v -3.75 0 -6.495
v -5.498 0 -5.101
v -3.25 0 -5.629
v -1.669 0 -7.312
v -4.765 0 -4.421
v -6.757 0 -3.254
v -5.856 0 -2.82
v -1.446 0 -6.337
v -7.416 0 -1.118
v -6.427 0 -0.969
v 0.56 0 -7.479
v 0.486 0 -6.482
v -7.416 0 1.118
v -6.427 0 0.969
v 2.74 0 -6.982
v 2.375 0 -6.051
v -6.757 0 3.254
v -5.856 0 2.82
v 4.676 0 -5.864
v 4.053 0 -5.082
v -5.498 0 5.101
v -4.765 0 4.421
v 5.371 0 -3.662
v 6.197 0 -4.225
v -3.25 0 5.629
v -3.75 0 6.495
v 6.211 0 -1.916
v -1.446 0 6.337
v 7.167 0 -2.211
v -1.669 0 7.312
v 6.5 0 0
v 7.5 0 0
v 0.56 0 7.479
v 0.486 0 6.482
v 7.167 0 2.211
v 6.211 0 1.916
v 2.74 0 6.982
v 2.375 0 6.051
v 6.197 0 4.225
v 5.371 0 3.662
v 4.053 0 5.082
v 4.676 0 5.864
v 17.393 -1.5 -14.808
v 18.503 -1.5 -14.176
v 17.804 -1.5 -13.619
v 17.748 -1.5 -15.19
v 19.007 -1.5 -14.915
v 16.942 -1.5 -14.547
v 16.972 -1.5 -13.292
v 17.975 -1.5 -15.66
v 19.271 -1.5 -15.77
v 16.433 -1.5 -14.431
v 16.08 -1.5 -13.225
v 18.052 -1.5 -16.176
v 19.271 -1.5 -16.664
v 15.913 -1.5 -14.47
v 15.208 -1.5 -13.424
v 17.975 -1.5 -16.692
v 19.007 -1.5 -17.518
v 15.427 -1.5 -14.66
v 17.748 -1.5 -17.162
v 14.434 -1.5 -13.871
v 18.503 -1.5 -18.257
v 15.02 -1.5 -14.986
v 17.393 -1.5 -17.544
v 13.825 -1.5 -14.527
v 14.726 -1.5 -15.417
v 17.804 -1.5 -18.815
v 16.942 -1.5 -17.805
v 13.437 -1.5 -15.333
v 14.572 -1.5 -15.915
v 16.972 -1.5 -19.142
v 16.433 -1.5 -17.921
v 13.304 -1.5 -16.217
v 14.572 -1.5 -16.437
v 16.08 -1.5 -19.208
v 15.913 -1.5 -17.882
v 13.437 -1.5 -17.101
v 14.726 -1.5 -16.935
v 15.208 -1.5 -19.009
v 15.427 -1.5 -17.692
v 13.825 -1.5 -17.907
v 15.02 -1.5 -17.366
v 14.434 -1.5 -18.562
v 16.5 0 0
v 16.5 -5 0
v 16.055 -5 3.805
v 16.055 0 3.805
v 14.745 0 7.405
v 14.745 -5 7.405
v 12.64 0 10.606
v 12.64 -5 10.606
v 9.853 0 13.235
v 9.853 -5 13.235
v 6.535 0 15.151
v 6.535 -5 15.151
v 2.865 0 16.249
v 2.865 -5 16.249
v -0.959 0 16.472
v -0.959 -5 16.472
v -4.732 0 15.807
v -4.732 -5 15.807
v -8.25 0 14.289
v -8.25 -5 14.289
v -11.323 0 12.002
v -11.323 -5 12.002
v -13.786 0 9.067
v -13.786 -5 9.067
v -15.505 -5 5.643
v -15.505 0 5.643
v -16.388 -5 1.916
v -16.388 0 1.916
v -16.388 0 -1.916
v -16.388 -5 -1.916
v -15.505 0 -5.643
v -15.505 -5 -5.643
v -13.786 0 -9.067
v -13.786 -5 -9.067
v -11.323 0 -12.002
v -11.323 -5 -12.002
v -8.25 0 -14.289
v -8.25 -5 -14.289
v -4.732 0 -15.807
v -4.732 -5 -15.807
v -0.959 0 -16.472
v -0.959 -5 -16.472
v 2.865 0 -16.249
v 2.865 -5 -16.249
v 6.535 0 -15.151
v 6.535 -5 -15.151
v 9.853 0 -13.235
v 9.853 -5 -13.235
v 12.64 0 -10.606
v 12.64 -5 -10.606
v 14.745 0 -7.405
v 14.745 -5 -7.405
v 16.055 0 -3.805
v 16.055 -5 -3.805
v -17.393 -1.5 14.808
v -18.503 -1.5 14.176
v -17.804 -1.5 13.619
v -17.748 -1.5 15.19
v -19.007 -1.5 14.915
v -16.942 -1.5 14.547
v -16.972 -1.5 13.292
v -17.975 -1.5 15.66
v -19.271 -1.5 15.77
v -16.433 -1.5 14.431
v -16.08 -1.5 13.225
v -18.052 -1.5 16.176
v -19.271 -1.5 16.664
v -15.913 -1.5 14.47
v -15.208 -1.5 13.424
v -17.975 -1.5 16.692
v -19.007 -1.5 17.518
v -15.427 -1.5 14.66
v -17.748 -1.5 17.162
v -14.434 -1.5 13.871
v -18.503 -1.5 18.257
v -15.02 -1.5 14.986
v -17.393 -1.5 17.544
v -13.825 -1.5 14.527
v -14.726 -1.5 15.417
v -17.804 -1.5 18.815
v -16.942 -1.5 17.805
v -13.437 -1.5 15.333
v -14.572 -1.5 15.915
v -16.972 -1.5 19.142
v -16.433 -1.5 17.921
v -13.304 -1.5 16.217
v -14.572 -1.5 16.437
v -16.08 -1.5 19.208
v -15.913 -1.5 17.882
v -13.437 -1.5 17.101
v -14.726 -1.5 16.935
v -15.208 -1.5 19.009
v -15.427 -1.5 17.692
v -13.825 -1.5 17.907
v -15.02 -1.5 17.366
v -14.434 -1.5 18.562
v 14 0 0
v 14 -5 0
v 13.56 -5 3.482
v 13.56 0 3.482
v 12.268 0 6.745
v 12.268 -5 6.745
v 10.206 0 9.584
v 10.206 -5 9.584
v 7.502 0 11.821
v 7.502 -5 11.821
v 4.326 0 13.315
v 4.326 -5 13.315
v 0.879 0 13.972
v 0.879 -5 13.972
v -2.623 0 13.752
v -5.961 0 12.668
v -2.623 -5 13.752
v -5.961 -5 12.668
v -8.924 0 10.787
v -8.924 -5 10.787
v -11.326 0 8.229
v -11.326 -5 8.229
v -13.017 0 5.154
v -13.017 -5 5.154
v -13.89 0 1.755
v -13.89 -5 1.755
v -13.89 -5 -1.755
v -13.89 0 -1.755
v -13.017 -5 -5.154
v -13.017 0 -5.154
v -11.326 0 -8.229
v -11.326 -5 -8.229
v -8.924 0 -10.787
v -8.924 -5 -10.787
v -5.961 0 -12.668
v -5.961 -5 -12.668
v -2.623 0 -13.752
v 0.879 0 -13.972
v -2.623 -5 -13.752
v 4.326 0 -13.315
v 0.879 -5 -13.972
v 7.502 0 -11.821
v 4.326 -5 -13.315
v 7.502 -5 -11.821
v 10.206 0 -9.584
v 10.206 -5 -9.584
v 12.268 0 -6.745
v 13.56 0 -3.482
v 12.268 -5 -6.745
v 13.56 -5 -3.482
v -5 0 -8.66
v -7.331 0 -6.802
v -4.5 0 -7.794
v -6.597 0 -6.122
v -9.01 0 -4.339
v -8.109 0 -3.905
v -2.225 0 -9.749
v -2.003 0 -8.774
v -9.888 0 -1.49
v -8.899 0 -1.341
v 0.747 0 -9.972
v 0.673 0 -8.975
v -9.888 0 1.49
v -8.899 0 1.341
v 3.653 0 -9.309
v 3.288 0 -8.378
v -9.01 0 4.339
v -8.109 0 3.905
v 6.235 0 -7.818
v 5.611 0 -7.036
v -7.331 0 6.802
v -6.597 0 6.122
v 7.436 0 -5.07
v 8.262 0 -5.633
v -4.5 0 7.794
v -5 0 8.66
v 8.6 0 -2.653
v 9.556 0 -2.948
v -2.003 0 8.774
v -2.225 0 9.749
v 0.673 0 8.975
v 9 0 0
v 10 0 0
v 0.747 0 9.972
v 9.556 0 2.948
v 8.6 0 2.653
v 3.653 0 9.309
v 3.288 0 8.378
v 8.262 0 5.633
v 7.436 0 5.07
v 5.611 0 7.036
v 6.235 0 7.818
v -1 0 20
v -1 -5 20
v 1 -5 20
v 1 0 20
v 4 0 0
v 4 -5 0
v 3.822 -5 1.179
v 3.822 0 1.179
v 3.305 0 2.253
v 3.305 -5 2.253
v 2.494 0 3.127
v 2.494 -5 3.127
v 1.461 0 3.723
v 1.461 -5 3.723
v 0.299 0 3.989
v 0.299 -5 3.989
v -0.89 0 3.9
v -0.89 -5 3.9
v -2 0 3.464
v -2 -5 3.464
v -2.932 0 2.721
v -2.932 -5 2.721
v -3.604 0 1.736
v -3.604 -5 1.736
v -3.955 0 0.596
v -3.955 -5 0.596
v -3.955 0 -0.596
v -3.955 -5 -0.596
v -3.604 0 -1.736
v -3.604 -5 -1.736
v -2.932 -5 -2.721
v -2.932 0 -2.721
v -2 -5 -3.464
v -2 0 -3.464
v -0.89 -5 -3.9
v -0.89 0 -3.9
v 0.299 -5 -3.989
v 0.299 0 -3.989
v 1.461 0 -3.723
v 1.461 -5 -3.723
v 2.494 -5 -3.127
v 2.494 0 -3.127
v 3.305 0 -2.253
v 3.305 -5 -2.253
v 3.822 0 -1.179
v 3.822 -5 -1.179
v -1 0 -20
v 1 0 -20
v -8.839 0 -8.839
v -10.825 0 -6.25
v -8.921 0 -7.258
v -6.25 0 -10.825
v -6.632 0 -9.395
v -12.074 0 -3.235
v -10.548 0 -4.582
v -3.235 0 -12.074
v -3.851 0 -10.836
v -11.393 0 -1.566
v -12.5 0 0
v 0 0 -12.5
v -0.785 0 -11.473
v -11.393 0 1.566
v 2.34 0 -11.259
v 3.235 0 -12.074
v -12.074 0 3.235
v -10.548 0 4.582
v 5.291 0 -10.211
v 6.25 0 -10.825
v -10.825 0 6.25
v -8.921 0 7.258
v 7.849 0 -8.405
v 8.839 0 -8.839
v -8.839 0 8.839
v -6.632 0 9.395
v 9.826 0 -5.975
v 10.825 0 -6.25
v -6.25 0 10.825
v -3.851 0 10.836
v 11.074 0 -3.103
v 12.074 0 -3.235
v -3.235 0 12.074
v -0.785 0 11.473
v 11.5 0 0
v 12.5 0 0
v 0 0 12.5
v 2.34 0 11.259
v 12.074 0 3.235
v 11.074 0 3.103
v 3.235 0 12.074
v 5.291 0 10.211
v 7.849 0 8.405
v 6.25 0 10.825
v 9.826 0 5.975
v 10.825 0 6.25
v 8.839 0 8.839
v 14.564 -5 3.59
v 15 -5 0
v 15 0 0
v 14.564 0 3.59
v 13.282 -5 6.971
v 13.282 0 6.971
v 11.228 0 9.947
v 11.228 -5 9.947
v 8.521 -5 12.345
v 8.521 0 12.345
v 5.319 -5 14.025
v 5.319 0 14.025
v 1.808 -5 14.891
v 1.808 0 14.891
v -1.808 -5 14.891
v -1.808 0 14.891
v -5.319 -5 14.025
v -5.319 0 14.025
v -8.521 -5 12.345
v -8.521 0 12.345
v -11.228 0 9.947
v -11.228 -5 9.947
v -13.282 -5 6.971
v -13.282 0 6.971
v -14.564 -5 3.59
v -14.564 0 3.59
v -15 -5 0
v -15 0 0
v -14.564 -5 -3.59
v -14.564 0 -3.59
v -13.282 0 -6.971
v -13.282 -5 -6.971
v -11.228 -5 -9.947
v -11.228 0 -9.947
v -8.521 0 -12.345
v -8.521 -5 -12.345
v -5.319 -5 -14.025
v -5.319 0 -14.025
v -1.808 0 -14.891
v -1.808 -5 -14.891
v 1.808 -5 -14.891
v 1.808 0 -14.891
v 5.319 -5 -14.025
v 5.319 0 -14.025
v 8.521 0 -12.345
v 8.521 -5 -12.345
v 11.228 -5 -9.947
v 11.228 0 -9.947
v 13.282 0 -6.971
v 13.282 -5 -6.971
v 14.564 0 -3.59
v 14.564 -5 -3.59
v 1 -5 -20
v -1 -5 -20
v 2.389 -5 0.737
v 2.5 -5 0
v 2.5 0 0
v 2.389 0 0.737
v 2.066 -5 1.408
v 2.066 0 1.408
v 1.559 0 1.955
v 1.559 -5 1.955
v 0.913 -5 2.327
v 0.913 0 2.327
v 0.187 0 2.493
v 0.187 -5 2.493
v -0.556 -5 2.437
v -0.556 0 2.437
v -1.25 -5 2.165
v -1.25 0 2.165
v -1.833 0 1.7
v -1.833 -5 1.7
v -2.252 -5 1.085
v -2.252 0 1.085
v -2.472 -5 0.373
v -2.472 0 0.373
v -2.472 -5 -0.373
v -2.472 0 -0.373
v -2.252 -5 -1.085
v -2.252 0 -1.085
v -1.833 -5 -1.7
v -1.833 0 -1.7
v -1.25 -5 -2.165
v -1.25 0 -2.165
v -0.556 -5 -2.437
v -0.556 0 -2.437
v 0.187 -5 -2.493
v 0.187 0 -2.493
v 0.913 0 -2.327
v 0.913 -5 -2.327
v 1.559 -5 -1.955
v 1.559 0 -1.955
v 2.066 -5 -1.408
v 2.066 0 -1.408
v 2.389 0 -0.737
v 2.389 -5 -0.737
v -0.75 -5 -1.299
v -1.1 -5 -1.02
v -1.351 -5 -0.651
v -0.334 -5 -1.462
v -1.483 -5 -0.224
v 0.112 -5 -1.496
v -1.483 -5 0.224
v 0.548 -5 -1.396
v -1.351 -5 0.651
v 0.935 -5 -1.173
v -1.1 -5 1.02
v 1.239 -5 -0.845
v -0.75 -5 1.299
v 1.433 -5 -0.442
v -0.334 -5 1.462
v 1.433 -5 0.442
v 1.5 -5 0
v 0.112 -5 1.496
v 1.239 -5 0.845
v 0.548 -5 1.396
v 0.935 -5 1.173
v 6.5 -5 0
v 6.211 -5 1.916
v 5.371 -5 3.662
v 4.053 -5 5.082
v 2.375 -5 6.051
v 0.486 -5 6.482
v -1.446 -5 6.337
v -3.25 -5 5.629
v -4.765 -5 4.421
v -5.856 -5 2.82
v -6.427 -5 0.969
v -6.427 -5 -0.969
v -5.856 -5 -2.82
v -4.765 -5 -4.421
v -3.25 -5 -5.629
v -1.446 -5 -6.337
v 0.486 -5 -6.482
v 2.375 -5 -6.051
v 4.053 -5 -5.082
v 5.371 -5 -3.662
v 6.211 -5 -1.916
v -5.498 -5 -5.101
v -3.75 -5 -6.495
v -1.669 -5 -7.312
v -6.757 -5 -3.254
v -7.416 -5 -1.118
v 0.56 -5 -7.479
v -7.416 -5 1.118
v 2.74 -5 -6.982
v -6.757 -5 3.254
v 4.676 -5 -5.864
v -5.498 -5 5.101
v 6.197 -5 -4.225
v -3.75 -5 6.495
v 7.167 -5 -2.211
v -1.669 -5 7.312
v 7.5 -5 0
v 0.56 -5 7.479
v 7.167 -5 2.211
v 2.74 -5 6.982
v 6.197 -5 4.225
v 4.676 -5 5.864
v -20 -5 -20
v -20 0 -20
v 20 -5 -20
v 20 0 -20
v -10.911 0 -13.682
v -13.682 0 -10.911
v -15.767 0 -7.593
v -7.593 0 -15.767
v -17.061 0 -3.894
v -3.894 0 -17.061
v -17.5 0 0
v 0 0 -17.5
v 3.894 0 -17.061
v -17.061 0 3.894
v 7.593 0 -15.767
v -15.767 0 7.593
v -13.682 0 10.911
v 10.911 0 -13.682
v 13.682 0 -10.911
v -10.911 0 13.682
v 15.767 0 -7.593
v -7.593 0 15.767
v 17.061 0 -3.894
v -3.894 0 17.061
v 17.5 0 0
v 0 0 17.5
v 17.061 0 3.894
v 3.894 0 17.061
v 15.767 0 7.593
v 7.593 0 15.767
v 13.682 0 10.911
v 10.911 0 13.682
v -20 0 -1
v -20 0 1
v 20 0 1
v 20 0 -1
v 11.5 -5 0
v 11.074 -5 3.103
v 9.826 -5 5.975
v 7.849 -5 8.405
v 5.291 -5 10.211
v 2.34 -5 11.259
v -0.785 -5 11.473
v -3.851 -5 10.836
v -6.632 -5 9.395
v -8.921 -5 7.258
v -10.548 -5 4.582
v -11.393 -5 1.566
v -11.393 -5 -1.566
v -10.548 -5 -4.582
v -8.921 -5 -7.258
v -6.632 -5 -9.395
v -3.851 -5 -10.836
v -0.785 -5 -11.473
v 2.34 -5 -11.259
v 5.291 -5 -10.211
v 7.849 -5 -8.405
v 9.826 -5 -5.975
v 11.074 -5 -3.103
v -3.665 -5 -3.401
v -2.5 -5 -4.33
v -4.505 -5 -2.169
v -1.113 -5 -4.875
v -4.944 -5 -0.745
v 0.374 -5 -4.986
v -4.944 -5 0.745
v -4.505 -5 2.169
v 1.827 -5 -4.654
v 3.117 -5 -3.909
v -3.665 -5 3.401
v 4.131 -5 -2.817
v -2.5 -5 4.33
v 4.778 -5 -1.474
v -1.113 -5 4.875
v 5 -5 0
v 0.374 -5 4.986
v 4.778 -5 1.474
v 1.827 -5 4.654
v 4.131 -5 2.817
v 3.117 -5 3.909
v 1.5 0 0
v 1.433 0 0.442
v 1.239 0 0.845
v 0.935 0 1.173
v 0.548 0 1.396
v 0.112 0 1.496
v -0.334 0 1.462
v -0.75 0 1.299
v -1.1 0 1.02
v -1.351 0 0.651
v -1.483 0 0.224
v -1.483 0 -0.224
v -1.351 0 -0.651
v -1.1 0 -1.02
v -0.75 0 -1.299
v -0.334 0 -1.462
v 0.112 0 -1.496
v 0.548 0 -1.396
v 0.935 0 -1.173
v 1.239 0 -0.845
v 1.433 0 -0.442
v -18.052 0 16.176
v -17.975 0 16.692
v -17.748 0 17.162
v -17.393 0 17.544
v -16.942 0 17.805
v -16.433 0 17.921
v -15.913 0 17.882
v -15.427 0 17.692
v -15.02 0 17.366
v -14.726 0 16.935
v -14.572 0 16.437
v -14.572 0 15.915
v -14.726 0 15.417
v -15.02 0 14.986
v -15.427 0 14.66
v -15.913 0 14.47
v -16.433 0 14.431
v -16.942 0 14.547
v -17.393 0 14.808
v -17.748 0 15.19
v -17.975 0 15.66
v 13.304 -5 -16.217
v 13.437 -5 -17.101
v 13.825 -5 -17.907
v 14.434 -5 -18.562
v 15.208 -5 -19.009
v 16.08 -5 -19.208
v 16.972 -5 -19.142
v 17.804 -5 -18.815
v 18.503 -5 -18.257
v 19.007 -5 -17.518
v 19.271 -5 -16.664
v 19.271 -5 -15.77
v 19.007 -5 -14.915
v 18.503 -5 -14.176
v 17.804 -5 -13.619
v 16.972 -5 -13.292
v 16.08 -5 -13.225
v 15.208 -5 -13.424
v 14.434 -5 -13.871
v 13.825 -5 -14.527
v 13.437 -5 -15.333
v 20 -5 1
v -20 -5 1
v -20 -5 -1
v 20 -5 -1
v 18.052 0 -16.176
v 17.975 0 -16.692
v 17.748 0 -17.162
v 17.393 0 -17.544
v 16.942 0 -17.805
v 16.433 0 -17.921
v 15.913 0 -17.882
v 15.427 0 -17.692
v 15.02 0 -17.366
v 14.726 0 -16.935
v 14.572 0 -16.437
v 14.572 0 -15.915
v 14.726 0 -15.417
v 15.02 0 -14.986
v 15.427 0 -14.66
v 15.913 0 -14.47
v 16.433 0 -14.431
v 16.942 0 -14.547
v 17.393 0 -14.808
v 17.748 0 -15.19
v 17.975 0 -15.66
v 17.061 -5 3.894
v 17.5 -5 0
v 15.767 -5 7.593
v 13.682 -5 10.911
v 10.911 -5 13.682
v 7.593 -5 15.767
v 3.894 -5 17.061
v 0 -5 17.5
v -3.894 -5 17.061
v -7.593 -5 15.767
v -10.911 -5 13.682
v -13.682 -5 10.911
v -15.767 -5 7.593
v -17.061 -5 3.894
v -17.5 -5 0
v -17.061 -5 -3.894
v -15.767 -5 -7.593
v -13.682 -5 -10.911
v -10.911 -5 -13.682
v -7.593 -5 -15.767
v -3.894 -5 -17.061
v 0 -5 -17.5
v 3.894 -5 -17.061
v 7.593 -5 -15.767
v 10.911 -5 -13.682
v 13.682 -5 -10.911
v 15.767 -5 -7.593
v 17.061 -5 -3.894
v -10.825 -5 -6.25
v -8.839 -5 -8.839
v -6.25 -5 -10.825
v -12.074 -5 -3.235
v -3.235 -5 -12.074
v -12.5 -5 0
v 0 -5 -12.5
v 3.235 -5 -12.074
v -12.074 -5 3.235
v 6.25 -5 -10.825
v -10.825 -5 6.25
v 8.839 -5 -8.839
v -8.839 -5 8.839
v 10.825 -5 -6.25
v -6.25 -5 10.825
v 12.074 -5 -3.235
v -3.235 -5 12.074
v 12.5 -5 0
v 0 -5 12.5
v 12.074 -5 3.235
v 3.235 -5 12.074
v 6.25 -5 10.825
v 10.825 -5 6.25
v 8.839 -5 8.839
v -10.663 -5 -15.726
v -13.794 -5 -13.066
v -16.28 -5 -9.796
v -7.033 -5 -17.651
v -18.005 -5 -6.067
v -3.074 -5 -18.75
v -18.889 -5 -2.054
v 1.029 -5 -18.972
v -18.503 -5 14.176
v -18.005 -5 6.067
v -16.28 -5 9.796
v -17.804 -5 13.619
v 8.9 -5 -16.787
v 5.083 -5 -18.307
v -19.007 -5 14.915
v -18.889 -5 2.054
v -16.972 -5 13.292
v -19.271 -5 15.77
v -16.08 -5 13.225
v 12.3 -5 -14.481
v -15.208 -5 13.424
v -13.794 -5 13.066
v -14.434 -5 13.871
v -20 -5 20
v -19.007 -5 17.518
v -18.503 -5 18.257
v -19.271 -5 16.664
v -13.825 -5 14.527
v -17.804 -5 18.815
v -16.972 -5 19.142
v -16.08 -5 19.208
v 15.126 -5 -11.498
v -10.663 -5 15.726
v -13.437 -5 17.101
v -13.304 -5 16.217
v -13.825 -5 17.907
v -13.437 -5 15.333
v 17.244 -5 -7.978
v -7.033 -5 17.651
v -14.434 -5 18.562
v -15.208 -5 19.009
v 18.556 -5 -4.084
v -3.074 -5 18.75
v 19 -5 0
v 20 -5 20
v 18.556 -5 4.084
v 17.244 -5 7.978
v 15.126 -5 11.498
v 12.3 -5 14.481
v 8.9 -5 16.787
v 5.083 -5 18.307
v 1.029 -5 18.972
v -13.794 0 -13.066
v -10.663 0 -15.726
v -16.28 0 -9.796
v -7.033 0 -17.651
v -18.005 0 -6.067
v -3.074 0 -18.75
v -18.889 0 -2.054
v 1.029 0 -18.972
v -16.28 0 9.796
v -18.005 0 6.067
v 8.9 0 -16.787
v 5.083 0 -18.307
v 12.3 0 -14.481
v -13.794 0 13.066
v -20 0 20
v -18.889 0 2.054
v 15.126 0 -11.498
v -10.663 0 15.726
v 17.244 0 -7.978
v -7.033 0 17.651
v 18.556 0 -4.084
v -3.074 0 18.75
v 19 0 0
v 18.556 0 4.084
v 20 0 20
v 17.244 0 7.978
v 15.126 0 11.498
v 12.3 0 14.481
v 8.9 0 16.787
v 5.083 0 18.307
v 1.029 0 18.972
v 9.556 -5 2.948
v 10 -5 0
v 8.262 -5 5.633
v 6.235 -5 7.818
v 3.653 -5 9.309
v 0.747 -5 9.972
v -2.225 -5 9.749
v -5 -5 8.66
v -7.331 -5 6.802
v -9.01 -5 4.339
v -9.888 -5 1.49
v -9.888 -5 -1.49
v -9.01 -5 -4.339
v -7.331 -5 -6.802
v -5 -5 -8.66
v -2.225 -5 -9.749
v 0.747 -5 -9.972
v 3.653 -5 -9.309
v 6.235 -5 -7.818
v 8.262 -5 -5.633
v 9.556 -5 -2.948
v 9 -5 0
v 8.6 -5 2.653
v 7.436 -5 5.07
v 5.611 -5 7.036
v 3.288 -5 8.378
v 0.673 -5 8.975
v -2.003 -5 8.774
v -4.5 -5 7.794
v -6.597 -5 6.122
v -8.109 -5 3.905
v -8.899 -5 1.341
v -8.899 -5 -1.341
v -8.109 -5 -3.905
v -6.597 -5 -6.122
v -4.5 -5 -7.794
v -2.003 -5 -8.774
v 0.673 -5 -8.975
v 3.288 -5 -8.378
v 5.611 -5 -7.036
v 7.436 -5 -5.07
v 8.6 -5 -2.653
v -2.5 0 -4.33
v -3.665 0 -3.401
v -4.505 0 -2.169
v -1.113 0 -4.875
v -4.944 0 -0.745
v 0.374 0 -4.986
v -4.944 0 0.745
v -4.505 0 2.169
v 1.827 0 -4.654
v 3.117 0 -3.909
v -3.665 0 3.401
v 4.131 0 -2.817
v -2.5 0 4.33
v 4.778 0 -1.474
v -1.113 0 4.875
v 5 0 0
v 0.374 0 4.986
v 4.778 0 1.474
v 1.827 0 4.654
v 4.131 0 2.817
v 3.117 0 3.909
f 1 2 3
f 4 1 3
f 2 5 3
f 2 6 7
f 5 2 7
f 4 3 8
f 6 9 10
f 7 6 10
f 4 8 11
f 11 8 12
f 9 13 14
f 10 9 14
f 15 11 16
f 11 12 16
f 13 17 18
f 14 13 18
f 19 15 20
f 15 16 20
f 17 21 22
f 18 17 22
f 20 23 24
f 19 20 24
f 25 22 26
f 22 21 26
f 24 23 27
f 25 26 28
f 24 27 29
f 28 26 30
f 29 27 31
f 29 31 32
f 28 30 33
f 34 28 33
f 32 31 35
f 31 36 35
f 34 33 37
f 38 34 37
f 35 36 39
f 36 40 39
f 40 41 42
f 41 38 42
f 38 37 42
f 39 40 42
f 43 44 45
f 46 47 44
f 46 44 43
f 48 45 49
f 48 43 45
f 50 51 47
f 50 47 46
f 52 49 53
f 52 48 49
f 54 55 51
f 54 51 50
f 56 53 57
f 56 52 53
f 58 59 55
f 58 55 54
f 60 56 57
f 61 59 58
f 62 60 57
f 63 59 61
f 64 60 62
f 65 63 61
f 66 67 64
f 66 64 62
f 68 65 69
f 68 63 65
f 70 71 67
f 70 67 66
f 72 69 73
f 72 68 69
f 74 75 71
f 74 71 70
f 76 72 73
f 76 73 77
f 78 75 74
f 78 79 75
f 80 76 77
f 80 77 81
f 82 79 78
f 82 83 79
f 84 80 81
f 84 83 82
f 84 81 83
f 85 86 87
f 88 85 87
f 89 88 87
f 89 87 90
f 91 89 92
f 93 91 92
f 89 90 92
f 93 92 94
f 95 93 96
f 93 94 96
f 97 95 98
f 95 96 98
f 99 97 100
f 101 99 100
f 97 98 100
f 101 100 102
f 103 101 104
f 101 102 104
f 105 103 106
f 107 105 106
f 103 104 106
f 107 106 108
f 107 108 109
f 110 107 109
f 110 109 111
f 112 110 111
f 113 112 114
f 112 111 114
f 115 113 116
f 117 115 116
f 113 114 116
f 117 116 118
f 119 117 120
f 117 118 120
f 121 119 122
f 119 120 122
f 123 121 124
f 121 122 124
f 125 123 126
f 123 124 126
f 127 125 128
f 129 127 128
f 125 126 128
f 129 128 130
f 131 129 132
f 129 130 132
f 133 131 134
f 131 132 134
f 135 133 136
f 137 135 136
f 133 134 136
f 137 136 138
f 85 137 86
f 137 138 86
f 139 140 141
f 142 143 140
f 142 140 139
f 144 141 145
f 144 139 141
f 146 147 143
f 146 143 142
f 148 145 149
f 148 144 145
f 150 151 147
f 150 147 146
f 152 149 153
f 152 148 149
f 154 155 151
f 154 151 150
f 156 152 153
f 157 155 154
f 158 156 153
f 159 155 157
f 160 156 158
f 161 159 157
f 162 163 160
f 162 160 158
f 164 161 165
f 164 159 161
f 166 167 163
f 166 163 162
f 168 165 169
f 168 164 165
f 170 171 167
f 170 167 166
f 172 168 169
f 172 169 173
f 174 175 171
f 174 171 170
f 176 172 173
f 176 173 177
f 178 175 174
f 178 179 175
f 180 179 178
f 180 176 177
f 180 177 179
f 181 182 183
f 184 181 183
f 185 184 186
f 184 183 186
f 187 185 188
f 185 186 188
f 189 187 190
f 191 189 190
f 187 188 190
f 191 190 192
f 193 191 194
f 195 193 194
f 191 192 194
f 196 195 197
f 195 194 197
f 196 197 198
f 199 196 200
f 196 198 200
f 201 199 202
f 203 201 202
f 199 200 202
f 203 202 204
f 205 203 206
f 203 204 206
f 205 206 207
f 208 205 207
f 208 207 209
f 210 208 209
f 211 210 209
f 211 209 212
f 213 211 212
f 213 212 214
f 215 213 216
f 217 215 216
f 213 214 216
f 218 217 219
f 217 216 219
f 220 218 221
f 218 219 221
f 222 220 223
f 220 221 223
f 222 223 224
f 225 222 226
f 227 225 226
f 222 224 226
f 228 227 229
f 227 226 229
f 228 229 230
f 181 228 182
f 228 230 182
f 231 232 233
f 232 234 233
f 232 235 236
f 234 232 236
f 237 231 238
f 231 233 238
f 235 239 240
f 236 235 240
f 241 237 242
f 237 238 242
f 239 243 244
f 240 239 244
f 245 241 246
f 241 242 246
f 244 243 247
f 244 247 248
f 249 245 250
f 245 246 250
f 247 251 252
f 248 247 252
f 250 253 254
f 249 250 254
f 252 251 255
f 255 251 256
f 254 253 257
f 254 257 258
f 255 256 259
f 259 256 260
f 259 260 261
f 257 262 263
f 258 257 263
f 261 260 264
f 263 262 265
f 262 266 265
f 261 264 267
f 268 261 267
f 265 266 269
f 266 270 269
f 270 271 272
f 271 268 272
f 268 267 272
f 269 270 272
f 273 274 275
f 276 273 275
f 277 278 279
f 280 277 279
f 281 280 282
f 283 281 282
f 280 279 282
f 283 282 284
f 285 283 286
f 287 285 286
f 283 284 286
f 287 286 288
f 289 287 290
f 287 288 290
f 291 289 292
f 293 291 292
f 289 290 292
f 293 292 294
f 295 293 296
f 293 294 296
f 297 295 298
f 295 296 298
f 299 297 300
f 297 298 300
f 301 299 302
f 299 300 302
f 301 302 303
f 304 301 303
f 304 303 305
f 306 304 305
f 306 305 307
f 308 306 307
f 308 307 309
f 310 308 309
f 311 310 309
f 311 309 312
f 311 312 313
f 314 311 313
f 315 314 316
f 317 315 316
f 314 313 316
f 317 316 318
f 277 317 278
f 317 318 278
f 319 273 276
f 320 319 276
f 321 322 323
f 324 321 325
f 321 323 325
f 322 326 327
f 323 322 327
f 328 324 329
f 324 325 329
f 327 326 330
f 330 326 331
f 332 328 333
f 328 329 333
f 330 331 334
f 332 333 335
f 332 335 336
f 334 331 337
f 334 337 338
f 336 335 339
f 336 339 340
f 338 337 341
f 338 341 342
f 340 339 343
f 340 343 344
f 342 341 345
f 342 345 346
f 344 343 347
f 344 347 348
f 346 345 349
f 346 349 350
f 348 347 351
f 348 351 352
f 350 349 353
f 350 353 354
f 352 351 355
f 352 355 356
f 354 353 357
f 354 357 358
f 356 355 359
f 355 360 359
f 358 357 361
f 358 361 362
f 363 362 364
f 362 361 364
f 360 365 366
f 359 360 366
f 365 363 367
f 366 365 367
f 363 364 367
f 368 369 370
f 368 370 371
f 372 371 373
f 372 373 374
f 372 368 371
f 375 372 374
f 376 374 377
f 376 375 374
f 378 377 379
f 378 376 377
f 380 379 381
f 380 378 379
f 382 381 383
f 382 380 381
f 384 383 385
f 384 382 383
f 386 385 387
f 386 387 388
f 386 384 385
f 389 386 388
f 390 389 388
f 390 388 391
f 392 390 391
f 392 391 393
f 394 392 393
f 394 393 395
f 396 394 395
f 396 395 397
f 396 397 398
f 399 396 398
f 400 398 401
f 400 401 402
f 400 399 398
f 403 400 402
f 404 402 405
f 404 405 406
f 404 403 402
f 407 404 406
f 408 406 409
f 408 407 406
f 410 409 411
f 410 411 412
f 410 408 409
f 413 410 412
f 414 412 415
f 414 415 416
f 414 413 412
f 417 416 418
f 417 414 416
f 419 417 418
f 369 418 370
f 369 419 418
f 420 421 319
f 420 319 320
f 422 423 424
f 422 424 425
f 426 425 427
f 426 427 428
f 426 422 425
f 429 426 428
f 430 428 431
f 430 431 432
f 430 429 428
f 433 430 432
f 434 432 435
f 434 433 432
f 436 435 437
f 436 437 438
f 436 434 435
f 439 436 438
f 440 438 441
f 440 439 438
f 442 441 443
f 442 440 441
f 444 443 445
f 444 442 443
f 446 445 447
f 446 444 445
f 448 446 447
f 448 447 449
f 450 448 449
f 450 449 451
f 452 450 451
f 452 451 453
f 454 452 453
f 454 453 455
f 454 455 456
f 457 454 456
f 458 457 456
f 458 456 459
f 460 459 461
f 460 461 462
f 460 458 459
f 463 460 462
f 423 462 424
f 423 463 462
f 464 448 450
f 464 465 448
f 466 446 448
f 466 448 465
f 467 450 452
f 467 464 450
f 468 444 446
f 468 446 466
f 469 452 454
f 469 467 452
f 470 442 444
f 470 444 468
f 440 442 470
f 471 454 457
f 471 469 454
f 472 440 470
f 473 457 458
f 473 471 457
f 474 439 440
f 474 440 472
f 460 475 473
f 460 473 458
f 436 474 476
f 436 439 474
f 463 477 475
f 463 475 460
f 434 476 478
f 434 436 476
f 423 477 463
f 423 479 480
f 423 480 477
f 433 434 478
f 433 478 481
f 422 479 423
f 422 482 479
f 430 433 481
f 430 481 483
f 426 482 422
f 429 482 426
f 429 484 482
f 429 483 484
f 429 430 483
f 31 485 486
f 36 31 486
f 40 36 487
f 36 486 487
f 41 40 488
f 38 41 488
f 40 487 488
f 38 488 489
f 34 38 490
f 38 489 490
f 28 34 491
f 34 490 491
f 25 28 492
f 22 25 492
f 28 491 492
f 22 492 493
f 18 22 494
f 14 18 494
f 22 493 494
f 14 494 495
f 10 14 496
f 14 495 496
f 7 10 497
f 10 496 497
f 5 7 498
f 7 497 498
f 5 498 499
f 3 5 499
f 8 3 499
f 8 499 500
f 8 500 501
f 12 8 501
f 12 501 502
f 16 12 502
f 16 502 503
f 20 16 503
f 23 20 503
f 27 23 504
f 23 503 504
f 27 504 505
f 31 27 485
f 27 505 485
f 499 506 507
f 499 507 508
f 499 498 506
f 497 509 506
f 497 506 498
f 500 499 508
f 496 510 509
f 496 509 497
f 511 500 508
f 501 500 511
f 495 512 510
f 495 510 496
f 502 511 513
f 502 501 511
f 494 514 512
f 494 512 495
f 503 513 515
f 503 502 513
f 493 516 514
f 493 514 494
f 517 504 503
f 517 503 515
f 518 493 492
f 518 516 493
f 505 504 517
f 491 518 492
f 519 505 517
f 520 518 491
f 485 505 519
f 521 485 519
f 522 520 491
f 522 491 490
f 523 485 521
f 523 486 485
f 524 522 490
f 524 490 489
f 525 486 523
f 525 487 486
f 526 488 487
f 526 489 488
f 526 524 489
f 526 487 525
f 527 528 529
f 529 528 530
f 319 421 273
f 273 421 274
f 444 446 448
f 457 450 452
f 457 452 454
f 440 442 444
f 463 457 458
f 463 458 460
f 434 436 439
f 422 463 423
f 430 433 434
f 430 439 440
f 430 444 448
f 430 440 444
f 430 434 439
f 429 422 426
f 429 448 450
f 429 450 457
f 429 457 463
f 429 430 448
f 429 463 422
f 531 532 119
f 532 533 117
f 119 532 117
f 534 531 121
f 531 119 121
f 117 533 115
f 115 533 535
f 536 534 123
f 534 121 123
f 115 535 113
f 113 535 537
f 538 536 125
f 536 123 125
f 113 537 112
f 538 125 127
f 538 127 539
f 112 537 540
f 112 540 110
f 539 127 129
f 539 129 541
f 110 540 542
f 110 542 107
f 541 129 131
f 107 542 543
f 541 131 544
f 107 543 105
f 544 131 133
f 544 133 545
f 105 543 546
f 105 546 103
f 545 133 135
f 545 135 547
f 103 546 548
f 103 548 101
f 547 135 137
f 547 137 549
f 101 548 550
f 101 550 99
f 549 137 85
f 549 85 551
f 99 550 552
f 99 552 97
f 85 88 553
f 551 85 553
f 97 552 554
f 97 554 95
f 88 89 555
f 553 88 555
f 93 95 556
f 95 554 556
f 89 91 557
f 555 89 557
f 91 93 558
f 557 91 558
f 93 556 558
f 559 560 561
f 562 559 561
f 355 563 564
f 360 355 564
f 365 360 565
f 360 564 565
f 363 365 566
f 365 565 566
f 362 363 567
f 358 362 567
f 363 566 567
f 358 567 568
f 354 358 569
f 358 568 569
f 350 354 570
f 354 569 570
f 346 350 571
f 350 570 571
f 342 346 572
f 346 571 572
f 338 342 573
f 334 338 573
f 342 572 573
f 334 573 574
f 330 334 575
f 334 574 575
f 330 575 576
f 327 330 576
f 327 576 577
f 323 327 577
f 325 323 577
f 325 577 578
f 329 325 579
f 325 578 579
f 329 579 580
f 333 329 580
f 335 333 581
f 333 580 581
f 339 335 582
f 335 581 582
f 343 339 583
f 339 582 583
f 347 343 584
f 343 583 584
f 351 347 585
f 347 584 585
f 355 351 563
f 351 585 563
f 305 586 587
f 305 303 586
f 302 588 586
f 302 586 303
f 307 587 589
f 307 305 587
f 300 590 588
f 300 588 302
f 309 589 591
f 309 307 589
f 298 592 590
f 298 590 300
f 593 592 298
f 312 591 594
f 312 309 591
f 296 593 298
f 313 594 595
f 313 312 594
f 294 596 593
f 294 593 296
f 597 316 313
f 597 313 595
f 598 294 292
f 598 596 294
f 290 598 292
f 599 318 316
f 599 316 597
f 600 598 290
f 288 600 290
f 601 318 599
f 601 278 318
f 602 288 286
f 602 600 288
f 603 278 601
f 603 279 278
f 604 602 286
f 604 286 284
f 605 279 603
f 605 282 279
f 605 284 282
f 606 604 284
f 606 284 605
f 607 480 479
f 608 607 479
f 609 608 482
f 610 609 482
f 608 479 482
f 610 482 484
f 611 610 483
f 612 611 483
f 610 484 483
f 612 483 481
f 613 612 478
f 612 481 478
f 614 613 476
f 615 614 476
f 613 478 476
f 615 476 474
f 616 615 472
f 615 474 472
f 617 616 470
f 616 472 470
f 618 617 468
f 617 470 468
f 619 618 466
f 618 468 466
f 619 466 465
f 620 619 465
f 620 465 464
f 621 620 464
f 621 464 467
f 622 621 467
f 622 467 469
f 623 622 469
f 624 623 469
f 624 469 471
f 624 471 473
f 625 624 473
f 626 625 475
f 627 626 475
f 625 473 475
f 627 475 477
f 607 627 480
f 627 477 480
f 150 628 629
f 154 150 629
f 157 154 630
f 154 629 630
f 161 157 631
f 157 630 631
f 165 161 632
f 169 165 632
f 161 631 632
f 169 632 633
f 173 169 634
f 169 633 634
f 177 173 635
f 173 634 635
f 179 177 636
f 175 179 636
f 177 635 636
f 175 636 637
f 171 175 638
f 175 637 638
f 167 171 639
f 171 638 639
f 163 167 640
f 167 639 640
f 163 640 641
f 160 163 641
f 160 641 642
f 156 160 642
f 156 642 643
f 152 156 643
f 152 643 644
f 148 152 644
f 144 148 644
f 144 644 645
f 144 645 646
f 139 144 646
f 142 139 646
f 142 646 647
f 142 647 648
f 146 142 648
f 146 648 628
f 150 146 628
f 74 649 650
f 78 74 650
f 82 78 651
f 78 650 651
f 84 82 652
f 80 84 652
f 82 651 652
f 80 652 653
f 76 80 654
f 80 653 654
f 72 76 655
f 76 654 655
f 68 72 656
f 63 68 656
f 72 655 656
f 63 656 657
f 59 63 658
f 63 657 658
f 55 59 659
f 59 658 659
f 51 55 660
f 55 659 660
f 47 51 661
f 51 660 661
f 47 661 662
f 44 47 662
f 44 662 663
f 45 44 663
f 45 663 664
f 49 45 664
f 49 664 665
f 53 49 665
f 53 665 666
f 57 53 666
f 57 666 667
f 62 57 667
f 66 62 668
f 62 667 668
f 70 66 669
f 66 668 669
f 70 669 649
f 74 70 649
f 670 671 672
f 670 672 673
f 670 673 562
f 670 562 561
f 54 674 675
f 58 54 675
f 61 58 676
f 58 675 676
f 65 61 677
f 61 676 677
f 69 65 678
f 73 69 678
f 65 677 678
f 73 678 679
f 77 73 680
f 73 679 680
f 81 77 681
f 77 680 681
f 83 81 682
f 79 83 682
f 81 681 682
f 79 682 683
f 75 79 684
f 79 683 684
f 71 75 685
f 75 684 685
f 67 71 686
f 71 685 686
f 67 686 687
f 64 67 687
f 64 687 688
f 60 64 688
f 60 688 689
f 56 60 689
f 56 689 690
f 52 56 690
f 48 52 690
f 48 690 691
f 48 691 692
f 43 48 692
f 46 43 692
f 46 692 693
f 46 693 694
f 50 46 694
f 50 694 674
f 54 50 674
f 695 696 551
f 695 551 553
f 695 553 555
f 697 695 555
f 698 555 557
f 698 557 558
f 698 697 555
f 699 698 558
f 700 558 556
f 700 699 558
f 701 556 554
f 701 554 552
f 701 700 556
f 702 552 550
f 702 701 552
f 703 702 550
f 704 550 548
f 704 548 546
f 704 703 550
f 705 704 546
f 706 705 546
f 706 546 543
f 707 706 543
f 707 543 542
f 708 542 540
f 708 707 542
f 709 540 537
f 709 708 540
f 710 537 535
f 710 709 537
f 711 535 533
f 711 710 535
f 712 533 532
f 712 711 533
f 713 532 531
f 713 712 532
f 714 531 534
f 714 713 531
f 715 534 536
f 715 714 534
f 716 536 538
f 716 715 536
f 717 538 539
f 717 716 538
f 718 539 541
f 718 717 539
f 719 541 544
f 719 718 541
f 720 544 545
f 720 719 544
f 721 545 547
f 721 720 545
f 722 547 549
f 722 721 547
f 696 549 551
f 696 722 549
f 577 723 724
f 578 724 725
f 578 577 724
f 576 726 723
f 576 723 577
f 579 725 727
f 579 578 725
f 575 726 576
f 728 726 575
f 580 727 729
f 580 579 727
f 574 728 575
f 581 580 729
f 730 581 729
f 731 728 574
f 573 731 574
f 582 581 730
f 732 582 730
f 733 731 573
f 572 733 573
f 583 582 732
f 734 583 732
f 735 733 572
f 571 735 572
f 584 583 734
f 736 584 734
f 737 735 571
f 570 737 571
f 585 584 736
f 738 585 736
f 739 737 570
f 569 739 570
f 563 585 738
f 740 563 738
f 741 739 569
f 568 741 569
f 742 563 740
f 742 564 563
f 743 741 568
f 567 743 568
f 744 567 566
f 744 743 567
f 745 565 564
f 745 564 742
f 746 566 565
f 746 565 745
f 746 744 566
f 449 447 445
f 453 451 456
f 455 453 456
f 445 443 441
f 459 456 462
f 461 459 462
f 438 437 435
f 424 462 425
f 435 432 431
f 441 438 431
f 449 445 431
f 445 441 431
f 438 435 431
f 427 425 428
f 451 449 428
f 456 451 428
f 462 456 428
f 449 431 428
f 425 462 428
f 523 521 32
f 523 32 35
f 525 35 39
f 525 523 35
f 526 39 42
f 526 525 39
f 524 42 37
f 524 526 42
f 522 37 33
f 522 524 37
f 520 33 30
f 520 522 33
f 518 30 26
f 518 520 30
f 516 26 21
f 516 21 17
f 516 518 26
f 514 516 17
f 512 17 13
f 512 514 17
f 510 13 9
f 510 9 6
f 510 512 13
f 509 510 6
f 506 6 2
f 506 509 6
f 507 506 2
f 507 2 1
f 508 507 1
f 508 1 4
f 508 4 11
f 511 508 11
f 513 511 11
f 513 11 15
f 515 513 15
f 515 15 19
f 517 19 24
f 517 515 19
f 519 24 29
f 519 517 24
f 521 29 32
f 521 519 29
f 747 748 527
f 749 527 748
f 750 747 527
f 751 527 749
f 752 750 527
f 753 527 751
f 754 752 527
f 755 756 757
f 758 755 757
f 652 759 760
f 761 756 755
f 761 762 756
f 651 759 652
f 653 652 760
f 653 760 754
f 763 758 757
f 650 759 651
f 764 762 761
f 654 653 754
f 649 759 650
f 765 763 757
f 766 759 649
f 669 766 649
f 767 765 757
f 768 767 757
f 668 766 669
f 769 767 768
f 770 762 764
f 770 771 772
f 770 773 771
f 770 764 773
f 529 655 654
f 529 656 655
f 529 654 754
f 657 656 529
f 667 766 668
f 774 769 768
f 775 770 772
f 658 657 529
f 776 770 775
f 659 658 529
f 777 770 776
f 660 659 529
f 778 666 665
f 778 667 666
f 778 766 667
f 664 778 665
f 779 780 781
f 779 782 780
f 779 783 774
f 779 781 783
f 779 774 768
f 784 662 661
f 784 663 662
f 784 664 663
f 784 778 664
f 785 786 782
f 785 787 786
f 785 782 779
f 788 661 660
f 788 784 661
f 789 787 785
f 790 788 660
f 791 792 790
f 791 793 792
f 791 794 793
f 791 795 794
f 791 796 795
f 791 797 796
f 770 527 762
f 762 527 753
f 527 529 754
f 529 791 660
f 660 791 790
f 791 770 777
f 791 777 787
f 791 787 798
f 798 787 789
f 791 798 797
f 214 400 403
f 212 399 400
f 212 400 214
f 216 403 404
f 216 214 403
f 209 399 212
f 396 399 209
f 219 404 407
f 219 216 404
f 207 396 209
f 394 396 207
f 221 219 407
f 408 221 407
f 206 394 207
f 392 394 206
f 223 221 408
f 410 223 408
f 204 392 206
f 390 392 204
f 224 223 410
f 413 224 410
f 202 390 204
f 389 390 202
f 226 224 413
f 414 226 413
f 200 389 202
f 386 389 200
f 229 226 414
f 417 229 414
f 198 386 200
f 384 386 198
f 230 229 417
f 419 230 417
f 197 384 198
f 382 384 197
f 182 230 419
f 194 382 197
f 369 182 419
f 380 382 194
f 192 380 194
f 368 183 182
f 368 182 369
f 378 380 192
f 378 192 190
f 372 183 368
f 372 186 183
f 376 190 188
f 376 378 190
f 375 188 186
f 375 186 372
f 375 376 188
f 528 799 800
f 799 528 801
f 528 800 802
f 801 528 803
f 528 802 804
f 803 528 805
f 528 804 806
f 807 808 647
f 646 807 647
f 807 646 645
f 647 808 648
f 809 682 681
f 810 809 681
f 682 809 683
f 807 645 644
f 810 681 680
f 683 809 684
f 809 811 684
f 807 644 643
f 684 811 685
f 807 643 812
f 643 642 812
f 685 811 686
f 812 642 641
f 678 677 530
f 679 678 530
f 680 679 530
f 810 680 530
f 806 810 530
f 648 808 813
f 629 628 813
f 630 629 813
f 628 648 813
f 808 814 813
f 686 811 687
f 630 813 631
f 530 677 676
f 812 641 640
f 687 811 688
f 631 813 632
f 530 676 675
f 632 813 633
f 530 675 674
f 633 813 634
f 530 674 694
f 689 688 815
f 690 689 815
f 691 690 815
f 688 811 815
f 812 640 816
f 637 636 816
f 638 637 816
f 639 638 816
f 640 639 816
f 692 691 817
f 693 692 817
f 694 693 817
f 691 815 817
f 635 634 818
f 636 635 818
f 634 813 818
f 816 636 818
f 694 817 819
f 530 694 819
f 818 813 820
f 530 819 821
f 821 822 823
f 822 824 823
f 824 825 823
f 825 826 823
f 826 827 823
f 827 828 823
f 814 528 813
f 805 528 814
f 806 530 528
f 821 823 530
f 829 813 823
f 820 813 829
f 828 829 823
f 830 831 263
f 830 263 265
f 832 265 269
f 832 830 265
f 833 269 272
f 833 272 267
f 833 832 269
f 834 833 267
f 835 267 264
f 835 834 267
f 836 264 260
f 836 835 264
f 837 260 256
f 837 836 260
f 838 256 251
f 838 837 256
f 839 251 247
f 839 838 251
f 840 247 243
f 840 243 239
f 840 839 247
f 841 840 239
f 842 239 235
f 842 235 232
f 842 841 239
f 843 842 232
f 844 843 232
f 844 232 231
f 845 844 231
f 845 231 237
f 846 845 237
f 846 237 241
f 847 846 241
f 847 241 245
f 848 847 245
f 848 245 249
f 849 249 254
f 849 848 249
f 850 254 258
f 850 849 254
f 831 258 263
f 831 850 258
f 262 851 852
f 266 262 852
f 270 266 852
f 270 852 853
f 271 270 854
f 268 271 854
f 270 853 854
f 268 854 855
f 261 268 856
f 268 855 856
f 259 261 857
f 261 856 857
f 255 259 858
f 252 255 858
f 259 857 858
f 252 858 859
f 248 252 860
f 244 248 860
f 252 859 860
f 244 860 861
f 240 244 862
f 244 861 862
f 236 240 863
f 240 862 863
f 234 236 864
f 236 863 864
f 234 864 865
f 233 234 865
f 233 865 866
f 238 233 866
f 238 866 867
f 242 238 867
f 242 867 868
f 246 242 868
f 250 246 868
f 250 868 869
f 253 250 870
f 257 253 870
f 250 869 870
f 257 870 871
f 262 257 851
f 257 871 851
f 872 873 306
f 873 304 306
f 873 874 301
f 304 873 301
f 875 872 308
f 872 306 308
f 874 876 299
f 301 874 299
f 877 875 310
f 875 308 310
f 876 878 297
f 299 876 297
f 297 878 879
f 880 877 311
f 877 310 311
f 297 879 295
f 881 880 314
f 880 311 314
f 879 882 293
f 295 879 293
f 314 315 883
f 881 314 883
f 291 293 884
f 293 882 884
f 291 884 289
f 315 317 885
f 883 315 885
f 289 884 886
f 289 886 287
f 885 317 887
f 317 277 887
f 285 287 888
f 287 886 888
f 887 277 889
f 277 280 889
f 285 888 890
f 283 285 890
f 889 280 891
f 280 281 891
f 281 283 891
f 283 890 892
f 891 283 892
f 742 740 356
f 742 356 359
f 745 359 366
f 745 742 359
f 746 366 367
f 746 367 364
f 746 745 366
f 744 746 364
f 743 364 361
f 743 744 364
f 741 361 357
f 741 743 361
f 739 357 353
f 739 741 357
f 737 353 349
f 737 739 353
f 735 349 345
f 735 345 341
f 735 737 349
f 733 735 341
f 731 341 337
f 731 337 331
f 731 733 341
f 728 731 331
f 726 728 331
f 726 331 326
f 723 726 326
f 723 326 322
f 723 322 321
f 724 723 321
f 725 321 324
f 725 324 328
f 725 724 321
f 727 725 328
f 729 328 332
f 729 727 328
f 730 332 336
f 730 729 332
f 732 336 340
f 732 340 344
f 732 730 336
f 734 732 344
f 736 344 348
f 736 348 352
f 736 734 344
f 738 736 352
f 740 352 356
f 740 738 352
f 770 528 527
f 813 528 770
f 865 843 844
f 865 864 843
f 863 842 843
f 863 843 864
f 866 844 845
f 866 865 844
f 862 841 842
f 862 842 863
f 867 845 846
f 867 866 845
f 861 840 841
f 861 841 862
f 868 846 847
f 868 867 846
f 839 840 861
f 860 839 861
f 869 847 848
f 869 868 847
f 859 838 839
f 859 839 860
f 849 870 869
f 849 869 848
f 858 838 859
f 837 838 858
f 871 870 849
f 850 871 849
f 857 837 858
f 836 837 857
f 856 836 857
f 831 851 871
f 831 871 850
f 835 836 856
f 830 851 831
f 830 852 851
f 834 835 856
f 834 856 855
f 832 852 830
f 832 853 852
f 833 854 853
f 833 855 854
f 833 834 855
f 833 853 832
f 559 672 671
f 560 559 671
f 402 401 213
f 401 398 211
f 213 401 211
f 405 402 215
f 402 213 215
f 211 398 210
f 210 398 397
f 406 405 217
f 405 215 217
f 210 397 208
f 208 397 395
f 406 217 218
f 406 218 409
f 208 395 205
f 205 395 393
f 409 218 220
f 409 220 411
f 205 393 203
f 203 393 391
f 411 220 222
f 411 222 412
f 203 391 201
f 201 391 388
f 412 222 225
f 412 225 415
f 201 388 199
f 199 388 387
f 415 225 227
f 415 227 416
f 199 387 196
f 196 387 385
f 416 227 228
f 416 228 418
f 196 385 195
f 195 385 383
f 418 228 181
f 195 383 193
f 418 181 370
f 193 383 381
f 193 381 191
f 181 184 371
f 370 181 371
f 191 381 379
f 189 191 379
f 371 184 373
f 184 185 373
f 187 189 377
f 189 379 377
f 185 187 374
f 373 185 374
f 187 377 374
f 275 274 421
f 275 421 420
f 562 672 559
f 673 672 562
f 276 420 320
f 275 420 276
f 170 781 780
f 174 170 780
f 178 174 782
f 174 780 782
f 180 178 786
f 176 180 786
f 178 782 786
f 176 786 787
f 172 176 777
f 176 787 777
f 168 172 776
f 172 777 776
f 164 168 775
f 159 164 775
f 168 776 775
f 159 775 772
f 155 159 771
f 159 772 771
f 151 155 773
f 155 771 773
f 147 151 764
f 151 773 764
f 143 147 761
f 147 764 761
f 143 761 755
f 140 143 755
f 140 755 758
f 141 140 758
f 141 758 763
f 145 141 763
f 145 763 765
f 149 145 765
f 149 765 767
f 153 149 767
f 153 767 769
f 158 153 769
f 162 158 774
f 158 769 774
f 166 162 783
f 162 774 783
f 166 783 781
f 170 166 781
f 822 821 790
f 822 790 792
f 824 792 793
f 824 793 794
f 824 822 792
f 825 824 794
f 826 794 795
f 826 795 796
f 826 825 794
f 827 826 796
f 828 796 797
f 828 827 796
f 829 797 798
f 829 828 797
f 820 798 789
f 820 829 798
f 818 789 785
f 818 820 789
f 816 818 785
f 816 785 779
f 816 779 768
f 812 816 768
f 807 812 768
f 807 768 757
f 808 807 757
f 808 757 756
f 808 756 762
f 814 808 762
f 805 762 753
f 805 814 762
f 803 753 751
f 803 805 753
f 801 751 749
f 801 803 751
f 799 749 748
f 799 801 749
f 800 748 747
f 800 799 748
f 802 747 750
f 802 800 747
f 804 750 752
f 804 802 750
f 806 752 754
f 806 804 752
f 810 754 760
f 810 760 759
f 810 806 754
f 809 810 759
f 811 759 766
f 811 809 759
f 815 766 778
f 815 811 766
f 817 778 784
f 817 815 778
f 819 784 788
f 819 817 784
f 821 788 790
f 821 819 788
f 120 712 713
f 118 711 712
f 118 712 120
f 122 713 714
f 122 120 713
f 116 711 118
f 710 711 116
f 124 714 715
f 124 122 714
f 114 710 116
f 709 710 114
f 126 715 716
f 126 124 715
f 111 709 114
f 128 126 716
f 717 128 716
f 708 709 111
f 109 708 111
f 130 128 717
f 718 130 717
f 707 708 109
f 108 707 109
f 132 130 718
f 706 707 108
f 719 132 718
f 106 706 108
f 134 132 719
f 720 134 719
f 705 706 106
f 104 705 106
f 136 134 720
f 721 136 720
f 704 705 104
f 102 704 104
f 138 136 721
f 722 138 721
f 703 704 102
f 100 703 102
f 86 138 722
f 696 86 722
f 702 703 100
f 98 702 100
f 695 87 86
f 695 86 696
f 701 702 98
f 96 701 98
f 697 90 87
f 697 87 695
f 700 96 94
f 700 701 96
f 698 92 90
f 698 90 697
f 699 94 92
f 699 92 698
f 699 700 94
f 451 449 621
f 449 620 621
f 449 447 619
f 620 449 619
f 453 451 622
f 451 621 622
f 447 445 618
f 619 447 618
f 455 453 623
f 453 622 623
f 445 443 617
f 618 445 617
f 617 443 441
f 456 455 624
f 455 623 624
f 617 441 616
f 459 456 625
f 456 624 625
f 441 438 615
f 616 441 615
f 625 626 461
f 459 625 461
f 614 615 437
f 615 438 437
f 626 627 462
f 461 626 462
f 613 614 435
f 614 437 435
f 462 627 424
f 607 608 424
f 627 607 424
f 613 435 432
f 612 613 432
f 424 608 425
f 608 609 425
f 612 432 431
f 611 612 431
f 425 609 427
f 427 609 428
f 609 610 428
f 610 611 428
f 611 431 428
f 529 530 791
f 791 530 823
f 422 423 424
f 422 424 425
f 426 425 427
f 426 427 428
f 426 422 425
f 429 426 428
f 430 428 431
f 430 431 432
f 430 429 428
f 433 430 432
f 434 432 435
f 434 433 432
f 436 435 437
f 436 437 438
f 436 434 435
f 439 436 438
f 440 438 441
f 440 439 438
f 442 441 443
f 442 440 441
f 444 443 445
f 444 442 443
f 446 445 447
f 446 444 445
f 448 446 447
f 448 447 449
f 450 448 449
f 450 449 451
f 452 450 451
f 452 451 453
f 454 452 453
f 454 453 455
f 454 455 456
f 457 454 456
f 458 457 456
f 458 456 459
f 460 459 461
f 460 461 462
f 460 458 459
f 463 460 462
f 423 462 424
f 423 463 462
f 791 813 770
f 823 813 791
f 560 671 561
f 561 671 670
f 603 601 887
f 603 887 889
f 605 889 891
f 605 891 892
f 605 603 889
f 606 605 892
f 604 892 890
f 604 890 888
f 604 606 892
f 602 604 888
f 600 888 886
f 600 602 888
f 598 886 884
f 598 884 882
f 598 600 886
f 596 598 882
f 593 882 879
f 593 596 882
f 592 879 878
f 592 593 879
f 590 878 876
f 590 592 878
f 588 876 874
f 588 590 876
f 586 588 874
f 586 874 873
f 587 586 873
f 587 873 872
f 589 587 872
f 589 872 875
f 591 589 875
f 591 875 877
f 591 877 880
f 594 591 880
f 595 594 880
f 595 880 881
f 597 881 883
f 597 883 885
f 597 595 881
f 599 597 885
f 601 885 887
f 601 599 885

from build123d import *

# Parameters (mm, degrees)
F0_W      = 40
F0_H      = 40
F0_R      = 19
F1_DEPTH  = 5
F3_R      = 1.75
F4_DEPTH  = 5
F2_R      = 3
F5_DEPTH  = 3.5
F7_COUNT  = 2
F9_R      = 10
F9_R_2    = 9
F19_DEPTH = 5
F10_R     = 5
F10_R_2   = 4
F11_R     = 7.5
F11_R_2   = 6.5
F12_R     = 2.5
F12_R_2   = 1.5
F13_R     = 2.5
F14_R     = 12.5
F14_R_2   = 11.5
F15_R     = 15
F15_R_2   = 14
F16_R     = 17.5
F16_R_2   = 16.5
F17_W     = 2
F17_H     = 40
F18_W     = 40
F18_H     = 2


with BuildPart() as f1:
    # F0 (on Front) → F1 (new body)
    with BuildSketch(Plane.XZ):
        Rectangle(F0_W, F0_H)
        Circle(F0_R, mode=Mode.SUBTRACT)
    extrude(amount=F1_DEPTH)


with BuildPart() as f4:
    # F3 (on face) → F4 (new body)
    with BuildSketch(Plane(origin=(0, 0, 0), x_dir=(-1, 0, 0), z_dir=(0, 1, 0))):
        with Locations((16.3023483751, 16.1759720192)):
            Circle(F3_R)
    extrude(amount=-F4_DEPTH)


with BuildPart() as f5:
    # F2 (on face) → F5 (new body)
    with BuildSketch(Plane.XZ.offset(5)):
        with Locations((-16.3040937899, 16.2168404302)):
            Circle(F2_R)
    extrude(amount=-F5_DEPTH)


with BuildPart() as f7_1:
    # F7: instance of F4
    add(f4.part.rotate(Axis((0, -5.2183736116, 0), (0, -1, 0)), 1 * 360 / F7_COUNT))


with BuildPart() as f7_2:
    # F7: instance of F5
    add(f5.part.rotate(Axis((0, -5.2183736116, 0), (0, -1, 0)), 1 * 360 / F7_COUNT))


with BuildPart() as f1_1:
    add(f1.part)

    # F8: cut F7_2, F7_1, F5, F4
    add(f7_2.part, mode=Mode.SUBTRACT)
    add(f7_1.part, mode=Mode.SUBTRACT)
    add(f5.part, mode=Mode.SUBTRACT)
    add(f4.part, mode=Mode.SUBTRACT)


with BuildPart() as f19:
    # F9 (on face) → F19 (new body)
    with BuildSketch(Plane.XZ.offset(5)):
        Circle(F9_R)
        Circle(F9_R_2, mode=Mode.SUBTRACT)
    extrude(amount=-F19_DEPTH)


with BuildPart() as f19b:
    # F10 (on face) → F19, piece 2 (new body)
    with BuildSketch(Plane.XZ.offset(5)):
        Circle(F10_R)
        Circle(F10_R_2, mode=Mode.SUBTRACT)
    extrude(amount=-F19_DEPTH)


with BuildPart() as f19c:
    # F11 (on face) → F19, piece 3 (new body)
    with BuildSketch(Plane.XZ.offset(5)):
        Circle(F11_R)
        Circle(F11_R_2, mode=Mode.SUBTRACT)
    extrude(amount=-F19_DEPTH)


with BuildPart() as f19d:
    # F12 (on face) → F19, piece 4 (new body)
    with BuildSketch(Plane.XZ.offset(5)):
        Circle(F12_R)
        Circle(F12_R_2, mode=Mode.SUBTRACT)
    extrude(amount=-F19_DEPTH)


with BuildPart() as f19e:
    # F13 (on face) → F19, piece 5 (new body)
    with BuildSketch(Plane.XZ.offset(5)):
        Circle(F13_R)
    extrude(amount=-F19_DEPTH)


with BuildPart() as f19f:
    # F14 (on face) → F19, piece 6 (new body)
    with BuildSketch(Plane.XZ.offset(5)):
        Circle(F14_R)
        Circle(F14_R_2, mode=Mode.SUBTRACT)
    extrude(amount=-F19_DEPTH)


with BuildPart() as f19g:
    # F15 (on face) → F19, piece 7 (new body)
    with BuildSketch(Plane.XZ.offset(5)):
        Circle(F15_R)
        Circle(F15_R_2, mode=Mode.SUBTRACT)
    extrude(amount=-F19_DEPTH)


with BuildPart() as f19h:
    # F16 (on face) → F19, piece 8 (new body)
    with BuildSketch(Plane.XZ.offset(5)):
        Circle(F16_R)
        Circle(F16_R_2, mode=Mode.SUBTRACT)
    extrude(amount=-F19_DEPTH)


with BuildPart() as f19i:
    # F17 (on face) → F19, piece 9 (new body)
    with BuildSketch(Plane.XZ.offset(5)):
        Rectangle(F17_W, F17_H)
    extrude(amount=-F19_DEPTH)


with BuildPart() as f19j:
    # F18 (on face) → F19, piece 10 (new body)
    with BuildSketch(Plane.XZ.offset(5)):
        Rectangle(F18_W, F18_H)
    extrude(amount=-F19_DEPTH)


solid = Compound([f1_1.part, f19.part, f19b.part, f19c.part, f19d.part, f19e.part, f19f.part, f19g.part, f19h.part, f19i.part, f19j.part])
